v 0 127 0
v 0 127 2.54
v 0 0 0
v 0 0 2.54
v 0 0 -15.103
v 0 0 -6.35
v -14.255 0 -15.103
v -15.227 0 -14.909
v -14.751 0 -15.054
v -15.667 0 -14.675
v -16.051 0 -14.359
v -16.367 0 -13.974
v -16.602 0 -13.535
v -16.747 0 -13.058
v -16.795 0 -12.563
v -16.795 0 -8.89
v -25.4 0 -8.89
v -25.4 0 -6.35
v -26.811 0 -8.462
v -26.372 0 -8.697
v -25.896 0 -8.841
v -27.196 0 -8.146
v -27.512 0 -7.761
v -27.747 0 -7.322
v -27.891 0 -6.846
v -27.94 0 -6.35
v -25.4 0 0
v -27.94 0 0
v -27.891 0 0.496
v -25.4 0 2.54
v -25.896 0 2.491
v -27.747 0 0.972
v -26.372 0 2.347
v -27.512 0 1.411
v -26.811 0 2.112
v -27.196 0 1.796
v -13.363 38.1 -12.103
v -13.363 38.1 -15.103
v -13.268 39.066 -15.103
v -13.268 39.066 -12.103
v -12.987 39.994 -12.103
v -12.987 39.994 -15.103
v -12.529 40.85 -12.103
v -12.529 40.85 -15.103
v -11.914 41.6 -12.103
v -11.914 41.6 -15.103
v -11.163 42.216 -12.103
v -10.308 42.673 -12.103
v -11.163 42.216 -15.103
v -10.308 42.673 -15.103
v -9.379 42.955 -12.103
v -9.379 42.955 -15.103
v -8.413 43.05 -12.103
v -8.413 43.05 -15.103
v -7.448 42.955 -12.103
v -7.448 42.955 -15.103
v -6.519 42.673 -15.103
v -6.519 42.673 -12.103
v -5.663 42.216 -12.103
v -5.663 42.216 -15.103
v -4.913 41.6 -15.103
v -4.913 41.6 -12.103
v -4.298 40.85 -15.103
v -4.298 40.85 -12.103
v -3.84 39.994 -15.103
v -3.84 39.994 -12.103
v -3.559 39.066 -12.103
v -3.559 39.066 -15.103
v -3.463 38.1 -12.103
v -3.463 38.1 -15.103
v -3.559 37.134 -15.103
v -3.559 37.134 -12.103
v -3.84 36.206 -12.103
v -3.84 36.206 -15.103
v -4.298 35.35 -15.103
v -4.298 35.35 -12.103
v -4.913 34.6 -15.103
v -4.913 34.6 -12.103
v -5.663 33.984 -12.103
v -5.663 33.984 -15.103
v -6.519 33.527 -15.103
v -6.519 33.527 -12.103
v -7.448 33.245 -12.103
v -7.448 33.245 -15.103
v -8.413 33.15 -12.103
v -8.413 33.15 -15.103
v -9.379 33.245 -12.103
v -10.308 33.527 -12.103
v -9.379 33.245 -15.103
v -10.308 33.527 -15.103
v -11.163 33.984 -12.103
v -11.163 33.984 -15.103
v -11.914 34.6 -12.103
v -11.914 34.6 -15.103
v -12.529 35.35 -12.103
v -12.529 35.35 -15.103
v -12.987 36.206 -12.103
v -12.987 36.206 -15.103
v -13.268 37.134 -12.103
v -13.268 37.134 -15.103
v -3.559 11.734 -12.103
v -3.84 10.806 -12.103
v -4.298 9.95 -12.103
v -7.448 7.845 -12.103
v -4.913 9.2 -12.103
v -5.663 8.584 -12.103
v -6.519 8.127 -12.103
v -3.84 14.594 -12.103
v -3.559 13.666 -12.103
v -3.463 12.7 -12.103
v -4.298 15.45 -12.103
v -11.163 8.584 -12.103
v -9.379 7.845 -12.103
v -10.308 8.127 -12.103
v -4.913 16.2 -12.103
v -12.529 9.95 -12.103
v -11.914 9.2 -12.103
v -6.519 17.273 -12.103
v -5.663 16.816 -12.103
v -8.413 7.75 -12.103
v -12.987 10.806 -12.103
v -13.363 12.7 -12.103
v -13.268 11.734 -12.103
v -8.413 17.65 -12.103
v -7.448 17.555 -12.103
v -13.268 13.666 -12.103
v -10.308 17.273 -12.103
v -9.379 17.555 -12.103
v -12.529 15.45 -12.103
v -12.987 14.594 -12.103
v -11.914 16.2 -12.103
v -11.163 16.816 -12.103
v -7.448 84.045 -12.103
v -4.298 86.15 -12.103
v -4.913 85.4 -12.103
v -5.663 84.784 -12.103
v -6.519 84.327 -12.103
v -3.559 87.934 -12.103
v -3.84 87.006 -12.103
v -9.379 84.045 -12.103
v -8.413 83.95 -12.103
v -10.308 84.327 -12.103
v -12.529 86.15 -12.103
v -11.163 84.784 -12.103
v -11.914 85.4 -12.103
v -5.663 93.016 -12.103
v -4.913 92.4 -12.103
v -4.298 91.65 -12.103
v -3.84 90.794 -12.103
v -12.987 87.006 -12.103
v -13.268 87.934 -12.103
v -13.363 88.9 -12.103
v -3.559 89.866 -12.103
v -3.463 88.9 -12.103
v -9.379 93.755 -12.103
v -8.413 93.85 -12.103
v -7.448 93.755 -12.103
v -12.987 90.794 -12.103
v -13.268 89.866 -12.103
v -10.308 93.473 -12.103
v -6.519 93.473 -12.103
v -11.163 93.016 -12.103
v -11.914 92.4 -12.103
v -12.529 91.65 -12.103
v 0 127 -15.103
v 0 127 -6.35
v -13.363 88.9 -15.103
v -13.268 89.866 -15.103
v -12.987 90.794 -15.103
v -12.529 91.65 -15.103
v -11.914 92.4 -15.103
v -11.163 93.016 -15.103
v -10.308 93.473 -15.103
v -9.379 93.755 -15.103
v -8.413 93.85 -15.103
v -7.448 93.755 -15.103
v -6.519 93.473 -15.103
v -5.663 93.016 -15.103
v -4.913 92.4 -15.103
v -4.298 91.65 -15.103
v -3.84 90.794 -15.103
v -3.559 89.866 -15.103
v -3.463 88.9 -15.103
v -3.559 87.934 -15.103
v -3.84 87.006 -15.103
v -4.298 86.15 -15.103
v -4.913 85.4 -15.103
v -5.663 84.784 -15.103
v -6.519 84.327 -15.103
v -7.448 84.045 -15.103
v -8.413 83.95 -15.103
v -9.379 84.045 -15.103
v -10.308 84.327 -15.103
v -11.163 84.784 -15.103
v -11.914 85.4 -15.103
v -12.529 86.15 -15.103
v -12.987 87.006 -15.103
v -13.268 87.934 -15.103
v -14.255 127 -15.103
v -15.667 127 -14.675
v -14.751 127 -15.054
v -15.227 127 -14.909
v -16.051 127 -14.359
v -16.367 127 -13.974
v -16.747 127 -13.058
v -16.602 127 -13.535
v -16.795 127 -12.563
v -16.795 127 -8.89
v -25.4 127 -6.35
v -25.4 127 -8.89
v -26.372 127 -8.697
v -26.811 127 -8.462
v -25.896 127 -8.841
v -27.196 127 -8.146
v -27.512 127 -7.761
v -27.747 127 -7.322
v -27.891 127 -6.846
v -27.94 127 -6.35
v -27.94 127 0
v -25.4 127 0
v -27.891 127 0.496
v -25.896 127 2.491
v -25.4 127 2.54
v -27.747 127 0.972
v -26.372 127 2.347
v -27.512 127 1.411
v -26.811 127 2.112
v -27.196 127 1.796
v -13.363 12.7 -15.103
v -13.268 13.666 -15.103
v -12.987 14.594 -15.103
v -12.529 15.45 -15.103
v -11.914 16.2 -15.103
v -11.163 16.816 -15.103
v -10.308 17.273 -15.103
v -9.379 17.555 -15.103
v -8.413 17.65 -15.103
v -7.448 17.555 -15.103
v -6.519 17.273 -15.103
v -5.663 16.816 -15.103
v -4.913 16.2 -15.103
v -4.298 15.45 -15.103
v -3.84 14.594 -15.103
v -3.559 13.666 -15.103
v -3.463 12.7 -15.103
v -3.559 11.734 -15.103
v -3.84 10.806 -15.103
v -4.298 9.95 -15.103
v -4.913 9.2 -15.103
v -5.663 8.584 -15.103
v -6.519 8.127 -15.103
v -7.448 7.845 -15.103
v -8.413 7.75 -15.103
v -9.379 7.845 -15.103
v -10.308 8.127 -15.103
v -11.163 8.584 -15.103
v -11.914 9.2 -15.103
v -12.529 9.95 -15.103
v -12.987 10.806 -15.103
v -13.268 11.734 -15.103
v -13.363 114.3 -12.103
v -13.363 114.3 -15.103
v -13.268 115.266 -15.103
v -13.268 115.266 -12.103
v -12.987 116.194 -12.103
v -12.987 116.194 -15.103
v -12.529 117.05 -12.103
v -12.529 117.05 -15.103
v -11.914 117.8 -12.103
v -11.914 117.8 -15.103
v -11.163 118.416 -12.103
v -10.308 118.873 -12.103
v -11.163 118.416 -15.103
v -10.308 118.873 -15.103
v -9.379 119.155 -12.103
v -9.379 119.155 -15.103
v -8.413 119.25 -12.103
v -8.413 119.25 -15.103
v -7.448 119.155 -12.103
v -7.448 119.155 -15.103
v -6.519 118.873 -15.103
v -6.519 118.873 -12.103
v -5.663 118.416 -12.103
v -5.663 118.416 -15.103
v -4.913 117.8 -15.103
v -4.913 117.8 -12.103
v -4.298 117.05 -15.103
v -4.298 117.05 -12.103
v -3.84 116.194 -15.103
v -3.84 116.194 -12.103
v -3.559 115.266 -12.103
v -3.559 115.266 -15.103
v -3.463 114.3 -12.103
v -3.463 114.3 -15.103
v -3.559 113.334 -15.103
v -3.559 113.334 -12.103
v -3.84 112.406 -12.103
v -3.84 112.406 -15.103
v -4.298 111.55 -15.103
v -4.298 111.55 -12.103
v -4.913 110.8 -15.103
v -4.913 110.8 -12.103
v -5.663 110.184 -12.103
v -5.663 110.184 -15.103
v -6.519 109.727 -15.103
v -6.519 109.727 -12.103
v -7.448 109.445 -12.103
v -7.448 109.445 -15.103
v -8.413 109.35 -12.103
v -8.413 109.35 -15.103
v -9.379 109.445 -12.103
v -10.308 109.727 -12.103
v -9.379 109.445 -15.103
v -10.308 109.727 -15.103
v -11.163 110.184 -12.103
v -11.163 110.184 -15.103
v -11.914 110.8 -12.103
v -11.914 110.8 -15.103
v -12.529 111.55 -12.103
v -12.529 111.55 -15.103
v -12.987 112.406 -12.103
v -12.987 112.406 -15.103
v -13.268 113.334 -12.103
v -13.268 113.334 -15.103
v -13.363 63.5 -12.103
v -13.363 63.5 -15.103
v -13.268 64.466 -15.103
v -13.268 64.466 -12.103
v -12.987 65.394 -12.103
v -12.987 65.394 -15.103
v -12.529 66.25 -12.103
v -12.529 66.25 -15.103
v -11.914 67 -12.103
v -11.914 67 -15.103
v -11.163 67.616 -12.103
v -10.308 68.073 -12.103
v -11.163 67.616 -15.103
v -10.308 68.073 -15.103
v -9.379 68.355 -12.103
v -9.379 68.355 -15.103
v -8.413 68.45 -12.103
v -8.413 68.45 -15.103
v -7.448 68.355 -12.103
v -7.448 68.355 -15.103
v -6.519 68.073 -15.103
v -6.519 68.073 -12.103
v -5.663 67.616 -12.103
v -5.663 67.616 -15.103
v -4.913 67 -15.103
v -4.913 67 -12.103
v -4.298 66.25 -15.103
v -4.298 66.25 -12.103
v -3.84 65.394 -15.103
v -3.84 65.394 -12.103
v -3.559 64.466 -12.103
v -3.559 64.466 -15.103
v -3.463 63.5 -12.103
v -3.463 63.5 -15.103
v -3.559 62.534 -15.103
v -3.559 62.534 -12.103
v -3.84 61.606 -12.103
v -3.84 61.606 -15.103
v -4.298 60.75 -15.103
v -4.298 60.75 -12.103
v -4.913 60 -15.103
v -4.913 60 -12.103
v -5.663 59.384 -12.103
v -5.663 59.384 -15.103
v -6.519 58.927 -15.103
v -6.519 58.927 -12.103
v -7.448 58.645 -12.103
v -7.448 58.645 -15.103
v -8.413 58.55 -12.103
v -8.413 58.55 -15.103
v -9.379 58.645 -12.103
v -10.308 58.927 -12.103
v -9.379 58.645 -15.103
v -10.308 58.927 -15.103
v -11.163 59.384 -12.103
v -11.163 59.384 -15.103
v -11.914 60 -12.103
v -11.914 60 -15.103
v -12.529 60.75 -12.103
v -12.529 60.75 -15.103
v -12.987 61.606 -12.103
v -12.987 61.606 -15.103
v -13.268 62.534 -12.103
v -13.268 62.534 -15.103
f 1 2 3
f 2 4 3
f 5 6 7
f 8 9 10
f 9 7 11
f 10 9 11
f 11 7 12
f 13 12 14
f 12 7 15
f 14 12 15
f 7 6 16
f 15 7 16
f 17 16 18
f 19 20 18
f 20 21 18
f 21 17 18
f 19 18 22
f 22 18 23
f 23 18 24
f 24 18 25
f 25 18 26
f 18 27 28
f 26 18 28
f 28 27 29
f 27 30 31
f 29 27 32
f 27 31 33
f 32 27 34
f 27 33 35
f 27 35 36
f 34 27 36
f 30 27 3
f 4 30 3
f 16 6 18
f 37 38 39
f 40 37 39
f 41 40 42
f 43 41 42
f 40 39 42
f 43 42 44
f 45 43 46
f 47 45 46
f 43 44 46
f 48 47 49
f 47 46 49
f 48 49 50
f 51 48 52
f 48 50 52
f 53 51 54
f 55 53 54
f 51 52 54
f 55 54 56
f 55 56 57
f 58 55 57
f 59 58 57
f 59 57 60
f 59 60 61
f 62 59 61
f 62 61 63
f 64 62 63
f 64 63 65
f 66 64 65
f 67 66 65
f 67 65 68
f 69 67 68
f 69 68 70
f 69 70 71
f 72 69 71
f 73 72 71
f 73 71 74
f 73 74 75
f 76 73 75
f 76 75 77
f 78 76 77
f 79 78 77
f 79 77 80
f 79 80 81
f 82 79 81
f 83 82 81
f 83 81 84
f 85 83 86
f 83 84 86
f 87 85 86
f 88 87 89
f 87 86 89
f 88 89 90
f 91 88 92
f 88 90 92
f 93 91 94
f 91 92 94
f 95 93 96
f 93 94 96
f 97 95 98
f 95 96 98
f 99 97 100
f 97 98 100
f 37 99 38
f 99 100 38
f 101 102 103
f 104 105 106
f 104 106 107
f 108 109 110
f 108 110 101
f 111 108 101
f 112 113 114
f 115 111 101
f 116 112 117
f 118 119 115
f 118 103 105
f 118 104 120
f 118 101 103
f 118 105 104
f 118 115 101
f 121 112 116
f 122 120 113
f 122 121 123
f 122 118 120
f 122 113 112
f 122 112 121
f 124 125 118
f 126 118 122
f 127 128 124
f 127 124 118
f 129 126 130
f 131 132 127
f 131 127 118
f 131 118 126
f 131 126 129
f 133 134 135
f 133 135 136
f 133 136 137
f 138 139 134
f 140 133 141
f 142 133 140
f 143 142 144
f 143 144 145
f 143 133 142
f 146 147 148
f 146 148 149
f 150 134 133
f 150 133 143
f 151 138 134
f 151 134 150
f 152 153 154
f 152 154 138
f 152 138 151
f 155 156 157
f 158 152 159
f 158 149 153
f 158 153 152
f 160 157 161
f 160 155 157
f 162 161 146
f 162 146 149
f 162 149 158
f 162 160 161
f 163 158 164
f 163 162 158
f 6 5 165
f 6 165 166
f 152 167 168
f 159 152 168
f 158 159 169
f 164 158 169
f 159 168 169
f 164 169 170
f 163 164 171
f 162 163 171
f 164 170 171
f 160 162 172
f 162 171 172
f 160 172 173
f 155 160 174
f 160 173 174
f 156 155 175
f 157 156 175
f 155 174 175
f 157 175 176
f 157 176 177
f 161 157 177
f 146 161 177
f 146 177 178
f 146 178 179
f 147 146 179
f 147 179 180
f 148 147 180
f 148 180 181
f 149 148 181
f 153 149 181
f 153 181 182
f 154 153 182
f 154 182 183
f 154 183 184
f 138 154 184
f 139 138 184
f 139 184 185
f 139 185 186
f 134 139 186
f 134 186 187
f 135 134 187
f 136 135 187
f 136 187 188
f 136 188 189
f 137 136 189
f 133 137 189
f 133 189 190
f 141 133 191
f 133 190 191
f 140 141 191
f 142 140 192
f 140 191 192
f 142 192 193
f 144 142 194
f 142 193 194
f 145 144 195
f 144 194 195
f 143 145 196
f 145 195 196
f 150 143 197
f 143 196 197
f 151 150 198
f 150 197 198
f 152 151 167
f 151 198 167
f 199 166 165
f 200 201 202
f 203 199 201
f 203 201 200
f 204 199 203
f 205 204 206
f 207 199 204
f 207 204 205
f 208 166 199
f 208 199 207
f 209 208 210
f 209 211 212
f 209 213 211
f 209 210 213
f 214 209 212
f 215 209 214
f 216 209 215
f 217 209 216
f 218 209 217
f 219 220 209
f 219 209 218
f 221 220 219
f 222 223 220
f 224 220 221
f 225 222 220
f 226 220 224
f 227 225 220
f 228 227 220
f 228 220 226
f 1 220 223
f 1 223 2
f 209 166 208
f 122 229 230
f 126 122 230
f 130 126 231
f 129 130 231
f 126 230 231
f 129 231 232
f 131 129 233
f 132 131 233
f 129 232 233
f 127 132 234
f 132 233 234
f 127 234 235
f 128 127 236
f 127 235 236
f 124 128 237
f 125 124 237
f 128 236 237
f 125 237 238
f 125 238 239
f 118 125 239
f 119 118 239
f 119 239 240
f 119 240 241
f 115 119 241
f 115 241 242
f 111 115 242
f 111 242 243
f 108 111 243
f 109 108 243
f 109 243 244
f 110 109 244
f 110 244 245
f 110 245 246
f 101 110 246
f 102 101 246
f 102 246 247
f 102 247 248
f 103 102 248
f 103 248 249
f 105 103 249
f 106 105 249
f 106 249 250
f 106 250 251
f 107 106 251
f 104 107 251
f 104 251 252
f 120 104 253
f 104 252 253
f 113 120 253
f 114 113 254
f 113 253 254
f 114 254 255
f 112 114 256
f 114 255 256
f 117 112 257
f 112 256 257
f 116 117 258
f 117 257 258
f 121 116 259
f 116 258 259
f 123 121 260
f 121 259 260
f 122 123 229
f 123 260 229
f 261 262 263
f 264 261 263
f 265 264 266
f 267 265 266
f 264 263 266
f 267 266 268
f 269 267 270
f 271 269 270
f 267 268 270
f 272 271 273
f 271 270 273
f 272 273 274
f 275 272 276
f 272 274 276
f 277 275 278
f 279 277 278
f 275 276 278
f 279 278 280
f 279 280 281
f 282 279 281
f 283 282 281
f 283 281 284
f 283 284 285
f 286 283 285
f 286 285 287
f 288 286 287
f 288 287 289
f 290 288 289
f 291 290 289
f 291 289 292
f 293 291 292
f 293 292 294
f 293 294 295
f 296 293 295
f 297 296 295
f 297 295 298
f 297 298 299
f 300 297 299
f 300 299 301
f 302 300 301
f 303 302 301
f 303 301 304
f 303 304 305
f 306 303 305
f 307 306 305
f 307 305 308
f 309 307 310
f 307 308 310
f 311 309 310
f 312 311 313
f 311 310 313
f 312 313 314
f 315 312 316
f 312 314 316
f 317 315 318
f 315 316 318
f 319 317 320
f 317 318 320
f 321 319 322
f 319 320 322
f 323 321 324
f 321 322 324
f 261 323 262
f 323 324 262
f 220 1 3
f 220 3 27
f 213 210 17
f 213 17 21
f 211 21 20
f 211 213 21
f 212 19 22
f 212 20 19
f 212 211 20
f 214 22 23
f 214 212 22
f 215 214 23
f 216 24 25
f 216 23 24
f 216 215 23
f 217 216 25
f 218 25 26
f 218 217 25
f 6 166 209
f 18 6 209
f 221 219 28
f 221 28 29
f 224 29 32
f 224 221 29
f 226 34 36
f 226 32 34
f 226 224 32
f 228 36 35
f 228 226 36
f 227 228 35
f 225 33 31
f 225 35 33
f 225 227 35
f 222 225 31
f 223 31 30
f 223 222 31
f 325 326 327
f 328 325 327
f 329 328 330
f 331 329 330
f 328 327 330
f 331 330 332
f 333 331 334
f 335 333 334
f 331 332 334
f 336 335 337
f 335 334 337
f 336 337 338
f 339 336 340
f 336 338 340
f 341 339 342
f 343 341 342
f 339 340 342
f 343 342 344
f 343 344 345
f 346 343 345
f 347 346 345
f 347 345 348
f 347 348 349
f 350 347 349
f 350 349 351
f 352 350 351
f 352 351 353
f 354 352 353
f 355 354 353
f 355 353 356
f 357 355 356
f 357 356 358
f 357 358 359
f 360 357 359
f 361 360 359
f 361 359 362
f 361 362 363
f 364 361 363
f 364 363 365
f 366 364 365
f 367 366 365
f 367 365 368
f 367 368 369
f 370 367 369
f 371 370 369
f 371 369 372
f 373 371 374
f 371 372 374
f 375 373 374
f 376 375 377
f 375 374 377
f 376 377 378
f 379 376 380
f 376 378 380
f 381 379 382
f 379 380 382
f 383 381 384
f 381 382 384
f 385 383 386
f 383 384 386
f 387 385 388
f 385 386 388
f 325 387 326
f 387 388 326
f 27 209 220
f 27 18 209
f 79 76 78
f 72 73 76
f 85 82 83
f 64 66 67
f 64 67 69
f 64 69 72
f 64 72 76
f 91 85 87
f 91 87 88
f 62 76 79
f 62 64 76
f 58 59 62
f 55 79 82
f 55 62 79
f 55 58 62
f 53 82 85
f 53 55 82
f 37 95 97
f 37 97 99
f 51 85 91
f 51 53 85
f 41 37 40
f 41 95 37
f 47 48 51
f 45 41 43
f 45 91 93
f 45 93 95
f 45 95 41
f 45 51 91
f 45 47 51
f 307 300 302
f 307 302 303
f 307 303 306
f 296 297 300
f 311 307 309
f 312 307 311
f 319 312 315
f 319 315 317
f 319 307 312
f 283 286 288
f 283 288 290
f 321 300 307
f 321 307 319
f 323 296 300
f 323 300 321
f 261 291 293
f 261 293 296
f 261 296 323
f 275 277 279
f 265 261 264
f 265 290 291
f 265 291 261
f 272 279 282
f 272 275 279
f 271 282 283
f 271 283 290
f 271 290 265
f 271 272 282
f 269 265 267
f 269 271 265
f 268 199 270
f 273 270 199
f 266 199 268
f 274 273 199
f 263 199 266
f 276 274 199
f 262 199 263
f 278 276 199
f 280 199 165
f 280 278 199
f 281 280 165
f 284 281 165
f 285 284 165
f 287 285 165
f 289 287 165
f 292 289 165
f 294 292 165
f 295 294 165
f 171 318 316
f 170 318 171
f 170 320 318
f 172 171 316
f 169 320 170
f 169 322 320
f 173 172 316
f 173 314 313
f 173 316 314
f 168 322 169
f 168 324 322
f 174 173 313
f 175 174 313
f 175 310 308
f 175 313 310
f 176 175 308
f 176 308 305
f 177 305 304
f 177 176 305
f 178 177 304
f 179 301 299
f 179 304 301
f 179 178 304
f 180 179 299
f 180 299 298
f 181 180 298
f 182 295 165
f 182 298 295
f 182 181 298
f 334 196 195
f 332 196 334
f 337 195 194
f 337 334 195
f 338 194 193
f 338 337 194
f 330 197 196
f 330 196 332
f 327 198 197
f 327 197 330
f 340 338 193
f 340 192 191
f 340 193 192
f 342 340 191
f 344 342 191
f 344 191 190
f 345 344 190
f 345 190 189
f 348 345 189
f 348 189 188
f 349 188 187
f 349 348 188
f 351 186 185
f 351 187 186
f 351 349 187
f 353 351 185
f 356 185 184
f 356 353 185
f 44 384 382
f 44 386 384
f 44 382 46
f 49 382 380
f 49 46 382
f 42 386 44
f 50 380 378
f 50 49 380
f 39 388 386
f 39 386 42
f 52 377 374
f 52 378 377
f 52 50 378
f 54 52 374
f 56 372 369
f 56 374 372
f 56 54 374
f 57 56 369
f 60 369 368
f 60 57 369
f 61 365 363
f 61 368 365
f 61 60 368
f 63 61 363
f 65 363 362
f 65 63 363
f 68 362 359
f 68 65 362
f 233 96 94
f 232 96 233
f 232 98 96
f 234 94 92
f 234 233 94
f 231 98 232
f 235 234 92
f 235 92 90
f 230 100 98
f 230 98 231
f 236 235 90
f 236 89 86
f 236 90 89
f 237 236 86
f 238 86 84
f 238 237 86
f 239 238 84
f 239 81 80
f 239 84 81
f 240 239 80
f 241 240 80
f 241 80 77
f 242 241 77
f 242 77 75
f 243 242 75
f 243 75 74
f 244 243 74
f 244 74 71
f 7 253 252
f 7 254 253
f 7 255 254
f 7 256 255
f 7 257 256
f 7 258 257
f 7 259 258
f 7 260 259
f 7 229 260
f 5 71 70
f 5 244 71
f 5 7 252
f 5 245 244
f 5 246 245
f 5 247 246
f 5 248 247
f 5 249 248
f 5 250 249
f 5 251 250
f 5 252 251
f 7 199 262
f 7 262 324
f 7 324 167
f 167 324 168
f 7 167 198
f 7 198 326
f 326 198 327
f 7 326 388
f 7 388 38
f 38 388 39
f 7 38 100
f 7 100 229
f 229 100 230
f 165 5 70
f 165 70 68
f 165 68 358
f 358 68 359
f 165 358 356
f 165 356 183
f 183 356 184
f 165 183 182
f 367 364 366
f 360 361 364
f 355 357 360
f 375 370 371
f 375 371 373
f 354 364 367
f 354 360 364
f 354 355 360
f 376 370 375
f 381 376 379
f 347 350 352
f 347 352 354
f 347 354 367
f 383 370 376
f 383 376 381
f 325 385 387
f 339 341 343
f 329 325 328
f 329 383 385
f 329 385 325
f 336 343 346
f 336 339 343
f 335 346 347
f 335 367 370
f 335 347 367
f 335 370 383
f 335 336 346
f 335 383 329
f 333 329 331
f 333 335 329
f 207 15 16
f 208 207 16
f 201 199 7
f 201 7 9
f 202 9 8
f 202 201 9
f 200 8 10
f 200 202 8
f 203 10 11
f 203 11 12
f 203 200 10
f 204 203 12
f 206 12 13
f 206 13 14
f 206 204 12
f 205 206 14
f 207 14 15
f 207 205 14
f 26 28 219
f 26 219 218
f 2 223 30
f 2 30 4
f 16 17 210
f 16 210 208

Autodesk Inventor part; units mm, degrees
ref_plane "YZ Plane" through (0, 0, 0) normal (1, 0, 0) x (0, 1, 0)
ref_plane "XZ Plane" through (0, 0, 0) normal (0, 1, 0) x (-1, 0, 0)
ref_plane "XY Plane" through (0, 0, 0) normal (0, 0, 1) x (1, 0, 0)
sketch "Sketch1" plane through (0, 0, 0) normal (0, 1, 0) x (-1, 0, 0)
  line L0 (0, 0) -> (25.4, 0)
  line L1 (25.4, 0) -> (25.4, 2.54)
  line L2 (25.4, 2.54) -> (0, 2.54)
  line L3 (0, 2.54) -> (0, 0)
  line L4 (25.4, 2.54) -> (27.94, 2.54)
  line L5 (27.94, 2.54) -> (27.94, -8.89)
  line L6 (27.94, -8.89) -> (25.4, -8.89)
  line L7 (25.4, -8.89) -> (25.4, 2.54)
  line L8 (-1.2994, 2.54) -> (27.94, 2.54)
  line L9 (25.4, -8.89) -> (0, -8.89)
  line L10 (0, -8.89) -> (0, -6.35)
  line L11 (0, -6.35) -> (25.4, -6.35)
  line L12 (25.4, -6.35) -> (25.4, -8.89)
  line L13 (8.3183, -8.89) -> (0, -8.89)
  line L14 (0, -8.89) -> (0, -12.3973)
  line L15 (0, -12.3973) -> (8.3183, -12.3973)
  line L16 (8.3183, -12.3973) -> (8.3183, -8.89)
  line L17 (0, -12.3973) -> (0, -6.35)
  line L18 (8.3183, -12.3973) -> (16.7954, -12.3973)
  line L19 (16.7954, -12.3973) -> (16.7954, -8.89)
  line L20 (16.7954, -8.89) -> (8.3183, -8.89)
  line L21 (8.3183, -8.89) -> (8.3183, -12.3973)
  line L22 (0, -12.3973) -> (16.7954, -12.3973)
  line L23 (16.7954, -12.3973) -> (16.7954, -15.1027)
  line L24 (16.7954, -15.1027) -> (0, -15.1027)
  line L25 (0, -15.1027) -> (0, -12.3973)
  point P0 (26.67, 2.54)
  point P1 (26.67, -8.89)
  point P2 (0, -8.89)
  point P3 (0, -8.89)
  dimension "d0" = 25.4
  dimension "d1" = 2.54
  dimension "d2" = 2.54
  dimension "d3" = 11.43
  dimension "d4" = 2.54
extrude "Extrusion1" add sketch "Sketch1" along normal blind 127
sketch "Sketch4" plane through (0, 0, -15.1027) normal (0, 0, -1) x (-1, 0, 0)
  circle A0 centre (8.4134, 114.3) radius 4.95
  line L0 (16.7954, 0) -> (16.7954, 127) projected
  circle A1 centre (8.4134, 88.9) radius 4.95
  circle A2 centre (8.4134, 63.5) radius 4.95
  circle A3 centre (8.4134, 38.1) radius 4.95
  circle A4 centre (8.4134, 12.7) radius 4.95
  line L1 (0, 127) -> (16.7954, 127) projected
  point P0 (0, 0)
  dimension "d15" = 9.9
  dimension "d16" = 8.382
  dimension "d19" = 25.4
  dimension "d24" = 12.7
extrude "Extrusion3" cut sketch "Sketch4" against normal blind 3
fillet "Fillet3" radius 2.54 3 edges at (-27.94, 63.5, -8.89) (-27.94, 63.5, 2.54) (-16.7954, 63.5, -15.1027)
properties part number "magnet"
